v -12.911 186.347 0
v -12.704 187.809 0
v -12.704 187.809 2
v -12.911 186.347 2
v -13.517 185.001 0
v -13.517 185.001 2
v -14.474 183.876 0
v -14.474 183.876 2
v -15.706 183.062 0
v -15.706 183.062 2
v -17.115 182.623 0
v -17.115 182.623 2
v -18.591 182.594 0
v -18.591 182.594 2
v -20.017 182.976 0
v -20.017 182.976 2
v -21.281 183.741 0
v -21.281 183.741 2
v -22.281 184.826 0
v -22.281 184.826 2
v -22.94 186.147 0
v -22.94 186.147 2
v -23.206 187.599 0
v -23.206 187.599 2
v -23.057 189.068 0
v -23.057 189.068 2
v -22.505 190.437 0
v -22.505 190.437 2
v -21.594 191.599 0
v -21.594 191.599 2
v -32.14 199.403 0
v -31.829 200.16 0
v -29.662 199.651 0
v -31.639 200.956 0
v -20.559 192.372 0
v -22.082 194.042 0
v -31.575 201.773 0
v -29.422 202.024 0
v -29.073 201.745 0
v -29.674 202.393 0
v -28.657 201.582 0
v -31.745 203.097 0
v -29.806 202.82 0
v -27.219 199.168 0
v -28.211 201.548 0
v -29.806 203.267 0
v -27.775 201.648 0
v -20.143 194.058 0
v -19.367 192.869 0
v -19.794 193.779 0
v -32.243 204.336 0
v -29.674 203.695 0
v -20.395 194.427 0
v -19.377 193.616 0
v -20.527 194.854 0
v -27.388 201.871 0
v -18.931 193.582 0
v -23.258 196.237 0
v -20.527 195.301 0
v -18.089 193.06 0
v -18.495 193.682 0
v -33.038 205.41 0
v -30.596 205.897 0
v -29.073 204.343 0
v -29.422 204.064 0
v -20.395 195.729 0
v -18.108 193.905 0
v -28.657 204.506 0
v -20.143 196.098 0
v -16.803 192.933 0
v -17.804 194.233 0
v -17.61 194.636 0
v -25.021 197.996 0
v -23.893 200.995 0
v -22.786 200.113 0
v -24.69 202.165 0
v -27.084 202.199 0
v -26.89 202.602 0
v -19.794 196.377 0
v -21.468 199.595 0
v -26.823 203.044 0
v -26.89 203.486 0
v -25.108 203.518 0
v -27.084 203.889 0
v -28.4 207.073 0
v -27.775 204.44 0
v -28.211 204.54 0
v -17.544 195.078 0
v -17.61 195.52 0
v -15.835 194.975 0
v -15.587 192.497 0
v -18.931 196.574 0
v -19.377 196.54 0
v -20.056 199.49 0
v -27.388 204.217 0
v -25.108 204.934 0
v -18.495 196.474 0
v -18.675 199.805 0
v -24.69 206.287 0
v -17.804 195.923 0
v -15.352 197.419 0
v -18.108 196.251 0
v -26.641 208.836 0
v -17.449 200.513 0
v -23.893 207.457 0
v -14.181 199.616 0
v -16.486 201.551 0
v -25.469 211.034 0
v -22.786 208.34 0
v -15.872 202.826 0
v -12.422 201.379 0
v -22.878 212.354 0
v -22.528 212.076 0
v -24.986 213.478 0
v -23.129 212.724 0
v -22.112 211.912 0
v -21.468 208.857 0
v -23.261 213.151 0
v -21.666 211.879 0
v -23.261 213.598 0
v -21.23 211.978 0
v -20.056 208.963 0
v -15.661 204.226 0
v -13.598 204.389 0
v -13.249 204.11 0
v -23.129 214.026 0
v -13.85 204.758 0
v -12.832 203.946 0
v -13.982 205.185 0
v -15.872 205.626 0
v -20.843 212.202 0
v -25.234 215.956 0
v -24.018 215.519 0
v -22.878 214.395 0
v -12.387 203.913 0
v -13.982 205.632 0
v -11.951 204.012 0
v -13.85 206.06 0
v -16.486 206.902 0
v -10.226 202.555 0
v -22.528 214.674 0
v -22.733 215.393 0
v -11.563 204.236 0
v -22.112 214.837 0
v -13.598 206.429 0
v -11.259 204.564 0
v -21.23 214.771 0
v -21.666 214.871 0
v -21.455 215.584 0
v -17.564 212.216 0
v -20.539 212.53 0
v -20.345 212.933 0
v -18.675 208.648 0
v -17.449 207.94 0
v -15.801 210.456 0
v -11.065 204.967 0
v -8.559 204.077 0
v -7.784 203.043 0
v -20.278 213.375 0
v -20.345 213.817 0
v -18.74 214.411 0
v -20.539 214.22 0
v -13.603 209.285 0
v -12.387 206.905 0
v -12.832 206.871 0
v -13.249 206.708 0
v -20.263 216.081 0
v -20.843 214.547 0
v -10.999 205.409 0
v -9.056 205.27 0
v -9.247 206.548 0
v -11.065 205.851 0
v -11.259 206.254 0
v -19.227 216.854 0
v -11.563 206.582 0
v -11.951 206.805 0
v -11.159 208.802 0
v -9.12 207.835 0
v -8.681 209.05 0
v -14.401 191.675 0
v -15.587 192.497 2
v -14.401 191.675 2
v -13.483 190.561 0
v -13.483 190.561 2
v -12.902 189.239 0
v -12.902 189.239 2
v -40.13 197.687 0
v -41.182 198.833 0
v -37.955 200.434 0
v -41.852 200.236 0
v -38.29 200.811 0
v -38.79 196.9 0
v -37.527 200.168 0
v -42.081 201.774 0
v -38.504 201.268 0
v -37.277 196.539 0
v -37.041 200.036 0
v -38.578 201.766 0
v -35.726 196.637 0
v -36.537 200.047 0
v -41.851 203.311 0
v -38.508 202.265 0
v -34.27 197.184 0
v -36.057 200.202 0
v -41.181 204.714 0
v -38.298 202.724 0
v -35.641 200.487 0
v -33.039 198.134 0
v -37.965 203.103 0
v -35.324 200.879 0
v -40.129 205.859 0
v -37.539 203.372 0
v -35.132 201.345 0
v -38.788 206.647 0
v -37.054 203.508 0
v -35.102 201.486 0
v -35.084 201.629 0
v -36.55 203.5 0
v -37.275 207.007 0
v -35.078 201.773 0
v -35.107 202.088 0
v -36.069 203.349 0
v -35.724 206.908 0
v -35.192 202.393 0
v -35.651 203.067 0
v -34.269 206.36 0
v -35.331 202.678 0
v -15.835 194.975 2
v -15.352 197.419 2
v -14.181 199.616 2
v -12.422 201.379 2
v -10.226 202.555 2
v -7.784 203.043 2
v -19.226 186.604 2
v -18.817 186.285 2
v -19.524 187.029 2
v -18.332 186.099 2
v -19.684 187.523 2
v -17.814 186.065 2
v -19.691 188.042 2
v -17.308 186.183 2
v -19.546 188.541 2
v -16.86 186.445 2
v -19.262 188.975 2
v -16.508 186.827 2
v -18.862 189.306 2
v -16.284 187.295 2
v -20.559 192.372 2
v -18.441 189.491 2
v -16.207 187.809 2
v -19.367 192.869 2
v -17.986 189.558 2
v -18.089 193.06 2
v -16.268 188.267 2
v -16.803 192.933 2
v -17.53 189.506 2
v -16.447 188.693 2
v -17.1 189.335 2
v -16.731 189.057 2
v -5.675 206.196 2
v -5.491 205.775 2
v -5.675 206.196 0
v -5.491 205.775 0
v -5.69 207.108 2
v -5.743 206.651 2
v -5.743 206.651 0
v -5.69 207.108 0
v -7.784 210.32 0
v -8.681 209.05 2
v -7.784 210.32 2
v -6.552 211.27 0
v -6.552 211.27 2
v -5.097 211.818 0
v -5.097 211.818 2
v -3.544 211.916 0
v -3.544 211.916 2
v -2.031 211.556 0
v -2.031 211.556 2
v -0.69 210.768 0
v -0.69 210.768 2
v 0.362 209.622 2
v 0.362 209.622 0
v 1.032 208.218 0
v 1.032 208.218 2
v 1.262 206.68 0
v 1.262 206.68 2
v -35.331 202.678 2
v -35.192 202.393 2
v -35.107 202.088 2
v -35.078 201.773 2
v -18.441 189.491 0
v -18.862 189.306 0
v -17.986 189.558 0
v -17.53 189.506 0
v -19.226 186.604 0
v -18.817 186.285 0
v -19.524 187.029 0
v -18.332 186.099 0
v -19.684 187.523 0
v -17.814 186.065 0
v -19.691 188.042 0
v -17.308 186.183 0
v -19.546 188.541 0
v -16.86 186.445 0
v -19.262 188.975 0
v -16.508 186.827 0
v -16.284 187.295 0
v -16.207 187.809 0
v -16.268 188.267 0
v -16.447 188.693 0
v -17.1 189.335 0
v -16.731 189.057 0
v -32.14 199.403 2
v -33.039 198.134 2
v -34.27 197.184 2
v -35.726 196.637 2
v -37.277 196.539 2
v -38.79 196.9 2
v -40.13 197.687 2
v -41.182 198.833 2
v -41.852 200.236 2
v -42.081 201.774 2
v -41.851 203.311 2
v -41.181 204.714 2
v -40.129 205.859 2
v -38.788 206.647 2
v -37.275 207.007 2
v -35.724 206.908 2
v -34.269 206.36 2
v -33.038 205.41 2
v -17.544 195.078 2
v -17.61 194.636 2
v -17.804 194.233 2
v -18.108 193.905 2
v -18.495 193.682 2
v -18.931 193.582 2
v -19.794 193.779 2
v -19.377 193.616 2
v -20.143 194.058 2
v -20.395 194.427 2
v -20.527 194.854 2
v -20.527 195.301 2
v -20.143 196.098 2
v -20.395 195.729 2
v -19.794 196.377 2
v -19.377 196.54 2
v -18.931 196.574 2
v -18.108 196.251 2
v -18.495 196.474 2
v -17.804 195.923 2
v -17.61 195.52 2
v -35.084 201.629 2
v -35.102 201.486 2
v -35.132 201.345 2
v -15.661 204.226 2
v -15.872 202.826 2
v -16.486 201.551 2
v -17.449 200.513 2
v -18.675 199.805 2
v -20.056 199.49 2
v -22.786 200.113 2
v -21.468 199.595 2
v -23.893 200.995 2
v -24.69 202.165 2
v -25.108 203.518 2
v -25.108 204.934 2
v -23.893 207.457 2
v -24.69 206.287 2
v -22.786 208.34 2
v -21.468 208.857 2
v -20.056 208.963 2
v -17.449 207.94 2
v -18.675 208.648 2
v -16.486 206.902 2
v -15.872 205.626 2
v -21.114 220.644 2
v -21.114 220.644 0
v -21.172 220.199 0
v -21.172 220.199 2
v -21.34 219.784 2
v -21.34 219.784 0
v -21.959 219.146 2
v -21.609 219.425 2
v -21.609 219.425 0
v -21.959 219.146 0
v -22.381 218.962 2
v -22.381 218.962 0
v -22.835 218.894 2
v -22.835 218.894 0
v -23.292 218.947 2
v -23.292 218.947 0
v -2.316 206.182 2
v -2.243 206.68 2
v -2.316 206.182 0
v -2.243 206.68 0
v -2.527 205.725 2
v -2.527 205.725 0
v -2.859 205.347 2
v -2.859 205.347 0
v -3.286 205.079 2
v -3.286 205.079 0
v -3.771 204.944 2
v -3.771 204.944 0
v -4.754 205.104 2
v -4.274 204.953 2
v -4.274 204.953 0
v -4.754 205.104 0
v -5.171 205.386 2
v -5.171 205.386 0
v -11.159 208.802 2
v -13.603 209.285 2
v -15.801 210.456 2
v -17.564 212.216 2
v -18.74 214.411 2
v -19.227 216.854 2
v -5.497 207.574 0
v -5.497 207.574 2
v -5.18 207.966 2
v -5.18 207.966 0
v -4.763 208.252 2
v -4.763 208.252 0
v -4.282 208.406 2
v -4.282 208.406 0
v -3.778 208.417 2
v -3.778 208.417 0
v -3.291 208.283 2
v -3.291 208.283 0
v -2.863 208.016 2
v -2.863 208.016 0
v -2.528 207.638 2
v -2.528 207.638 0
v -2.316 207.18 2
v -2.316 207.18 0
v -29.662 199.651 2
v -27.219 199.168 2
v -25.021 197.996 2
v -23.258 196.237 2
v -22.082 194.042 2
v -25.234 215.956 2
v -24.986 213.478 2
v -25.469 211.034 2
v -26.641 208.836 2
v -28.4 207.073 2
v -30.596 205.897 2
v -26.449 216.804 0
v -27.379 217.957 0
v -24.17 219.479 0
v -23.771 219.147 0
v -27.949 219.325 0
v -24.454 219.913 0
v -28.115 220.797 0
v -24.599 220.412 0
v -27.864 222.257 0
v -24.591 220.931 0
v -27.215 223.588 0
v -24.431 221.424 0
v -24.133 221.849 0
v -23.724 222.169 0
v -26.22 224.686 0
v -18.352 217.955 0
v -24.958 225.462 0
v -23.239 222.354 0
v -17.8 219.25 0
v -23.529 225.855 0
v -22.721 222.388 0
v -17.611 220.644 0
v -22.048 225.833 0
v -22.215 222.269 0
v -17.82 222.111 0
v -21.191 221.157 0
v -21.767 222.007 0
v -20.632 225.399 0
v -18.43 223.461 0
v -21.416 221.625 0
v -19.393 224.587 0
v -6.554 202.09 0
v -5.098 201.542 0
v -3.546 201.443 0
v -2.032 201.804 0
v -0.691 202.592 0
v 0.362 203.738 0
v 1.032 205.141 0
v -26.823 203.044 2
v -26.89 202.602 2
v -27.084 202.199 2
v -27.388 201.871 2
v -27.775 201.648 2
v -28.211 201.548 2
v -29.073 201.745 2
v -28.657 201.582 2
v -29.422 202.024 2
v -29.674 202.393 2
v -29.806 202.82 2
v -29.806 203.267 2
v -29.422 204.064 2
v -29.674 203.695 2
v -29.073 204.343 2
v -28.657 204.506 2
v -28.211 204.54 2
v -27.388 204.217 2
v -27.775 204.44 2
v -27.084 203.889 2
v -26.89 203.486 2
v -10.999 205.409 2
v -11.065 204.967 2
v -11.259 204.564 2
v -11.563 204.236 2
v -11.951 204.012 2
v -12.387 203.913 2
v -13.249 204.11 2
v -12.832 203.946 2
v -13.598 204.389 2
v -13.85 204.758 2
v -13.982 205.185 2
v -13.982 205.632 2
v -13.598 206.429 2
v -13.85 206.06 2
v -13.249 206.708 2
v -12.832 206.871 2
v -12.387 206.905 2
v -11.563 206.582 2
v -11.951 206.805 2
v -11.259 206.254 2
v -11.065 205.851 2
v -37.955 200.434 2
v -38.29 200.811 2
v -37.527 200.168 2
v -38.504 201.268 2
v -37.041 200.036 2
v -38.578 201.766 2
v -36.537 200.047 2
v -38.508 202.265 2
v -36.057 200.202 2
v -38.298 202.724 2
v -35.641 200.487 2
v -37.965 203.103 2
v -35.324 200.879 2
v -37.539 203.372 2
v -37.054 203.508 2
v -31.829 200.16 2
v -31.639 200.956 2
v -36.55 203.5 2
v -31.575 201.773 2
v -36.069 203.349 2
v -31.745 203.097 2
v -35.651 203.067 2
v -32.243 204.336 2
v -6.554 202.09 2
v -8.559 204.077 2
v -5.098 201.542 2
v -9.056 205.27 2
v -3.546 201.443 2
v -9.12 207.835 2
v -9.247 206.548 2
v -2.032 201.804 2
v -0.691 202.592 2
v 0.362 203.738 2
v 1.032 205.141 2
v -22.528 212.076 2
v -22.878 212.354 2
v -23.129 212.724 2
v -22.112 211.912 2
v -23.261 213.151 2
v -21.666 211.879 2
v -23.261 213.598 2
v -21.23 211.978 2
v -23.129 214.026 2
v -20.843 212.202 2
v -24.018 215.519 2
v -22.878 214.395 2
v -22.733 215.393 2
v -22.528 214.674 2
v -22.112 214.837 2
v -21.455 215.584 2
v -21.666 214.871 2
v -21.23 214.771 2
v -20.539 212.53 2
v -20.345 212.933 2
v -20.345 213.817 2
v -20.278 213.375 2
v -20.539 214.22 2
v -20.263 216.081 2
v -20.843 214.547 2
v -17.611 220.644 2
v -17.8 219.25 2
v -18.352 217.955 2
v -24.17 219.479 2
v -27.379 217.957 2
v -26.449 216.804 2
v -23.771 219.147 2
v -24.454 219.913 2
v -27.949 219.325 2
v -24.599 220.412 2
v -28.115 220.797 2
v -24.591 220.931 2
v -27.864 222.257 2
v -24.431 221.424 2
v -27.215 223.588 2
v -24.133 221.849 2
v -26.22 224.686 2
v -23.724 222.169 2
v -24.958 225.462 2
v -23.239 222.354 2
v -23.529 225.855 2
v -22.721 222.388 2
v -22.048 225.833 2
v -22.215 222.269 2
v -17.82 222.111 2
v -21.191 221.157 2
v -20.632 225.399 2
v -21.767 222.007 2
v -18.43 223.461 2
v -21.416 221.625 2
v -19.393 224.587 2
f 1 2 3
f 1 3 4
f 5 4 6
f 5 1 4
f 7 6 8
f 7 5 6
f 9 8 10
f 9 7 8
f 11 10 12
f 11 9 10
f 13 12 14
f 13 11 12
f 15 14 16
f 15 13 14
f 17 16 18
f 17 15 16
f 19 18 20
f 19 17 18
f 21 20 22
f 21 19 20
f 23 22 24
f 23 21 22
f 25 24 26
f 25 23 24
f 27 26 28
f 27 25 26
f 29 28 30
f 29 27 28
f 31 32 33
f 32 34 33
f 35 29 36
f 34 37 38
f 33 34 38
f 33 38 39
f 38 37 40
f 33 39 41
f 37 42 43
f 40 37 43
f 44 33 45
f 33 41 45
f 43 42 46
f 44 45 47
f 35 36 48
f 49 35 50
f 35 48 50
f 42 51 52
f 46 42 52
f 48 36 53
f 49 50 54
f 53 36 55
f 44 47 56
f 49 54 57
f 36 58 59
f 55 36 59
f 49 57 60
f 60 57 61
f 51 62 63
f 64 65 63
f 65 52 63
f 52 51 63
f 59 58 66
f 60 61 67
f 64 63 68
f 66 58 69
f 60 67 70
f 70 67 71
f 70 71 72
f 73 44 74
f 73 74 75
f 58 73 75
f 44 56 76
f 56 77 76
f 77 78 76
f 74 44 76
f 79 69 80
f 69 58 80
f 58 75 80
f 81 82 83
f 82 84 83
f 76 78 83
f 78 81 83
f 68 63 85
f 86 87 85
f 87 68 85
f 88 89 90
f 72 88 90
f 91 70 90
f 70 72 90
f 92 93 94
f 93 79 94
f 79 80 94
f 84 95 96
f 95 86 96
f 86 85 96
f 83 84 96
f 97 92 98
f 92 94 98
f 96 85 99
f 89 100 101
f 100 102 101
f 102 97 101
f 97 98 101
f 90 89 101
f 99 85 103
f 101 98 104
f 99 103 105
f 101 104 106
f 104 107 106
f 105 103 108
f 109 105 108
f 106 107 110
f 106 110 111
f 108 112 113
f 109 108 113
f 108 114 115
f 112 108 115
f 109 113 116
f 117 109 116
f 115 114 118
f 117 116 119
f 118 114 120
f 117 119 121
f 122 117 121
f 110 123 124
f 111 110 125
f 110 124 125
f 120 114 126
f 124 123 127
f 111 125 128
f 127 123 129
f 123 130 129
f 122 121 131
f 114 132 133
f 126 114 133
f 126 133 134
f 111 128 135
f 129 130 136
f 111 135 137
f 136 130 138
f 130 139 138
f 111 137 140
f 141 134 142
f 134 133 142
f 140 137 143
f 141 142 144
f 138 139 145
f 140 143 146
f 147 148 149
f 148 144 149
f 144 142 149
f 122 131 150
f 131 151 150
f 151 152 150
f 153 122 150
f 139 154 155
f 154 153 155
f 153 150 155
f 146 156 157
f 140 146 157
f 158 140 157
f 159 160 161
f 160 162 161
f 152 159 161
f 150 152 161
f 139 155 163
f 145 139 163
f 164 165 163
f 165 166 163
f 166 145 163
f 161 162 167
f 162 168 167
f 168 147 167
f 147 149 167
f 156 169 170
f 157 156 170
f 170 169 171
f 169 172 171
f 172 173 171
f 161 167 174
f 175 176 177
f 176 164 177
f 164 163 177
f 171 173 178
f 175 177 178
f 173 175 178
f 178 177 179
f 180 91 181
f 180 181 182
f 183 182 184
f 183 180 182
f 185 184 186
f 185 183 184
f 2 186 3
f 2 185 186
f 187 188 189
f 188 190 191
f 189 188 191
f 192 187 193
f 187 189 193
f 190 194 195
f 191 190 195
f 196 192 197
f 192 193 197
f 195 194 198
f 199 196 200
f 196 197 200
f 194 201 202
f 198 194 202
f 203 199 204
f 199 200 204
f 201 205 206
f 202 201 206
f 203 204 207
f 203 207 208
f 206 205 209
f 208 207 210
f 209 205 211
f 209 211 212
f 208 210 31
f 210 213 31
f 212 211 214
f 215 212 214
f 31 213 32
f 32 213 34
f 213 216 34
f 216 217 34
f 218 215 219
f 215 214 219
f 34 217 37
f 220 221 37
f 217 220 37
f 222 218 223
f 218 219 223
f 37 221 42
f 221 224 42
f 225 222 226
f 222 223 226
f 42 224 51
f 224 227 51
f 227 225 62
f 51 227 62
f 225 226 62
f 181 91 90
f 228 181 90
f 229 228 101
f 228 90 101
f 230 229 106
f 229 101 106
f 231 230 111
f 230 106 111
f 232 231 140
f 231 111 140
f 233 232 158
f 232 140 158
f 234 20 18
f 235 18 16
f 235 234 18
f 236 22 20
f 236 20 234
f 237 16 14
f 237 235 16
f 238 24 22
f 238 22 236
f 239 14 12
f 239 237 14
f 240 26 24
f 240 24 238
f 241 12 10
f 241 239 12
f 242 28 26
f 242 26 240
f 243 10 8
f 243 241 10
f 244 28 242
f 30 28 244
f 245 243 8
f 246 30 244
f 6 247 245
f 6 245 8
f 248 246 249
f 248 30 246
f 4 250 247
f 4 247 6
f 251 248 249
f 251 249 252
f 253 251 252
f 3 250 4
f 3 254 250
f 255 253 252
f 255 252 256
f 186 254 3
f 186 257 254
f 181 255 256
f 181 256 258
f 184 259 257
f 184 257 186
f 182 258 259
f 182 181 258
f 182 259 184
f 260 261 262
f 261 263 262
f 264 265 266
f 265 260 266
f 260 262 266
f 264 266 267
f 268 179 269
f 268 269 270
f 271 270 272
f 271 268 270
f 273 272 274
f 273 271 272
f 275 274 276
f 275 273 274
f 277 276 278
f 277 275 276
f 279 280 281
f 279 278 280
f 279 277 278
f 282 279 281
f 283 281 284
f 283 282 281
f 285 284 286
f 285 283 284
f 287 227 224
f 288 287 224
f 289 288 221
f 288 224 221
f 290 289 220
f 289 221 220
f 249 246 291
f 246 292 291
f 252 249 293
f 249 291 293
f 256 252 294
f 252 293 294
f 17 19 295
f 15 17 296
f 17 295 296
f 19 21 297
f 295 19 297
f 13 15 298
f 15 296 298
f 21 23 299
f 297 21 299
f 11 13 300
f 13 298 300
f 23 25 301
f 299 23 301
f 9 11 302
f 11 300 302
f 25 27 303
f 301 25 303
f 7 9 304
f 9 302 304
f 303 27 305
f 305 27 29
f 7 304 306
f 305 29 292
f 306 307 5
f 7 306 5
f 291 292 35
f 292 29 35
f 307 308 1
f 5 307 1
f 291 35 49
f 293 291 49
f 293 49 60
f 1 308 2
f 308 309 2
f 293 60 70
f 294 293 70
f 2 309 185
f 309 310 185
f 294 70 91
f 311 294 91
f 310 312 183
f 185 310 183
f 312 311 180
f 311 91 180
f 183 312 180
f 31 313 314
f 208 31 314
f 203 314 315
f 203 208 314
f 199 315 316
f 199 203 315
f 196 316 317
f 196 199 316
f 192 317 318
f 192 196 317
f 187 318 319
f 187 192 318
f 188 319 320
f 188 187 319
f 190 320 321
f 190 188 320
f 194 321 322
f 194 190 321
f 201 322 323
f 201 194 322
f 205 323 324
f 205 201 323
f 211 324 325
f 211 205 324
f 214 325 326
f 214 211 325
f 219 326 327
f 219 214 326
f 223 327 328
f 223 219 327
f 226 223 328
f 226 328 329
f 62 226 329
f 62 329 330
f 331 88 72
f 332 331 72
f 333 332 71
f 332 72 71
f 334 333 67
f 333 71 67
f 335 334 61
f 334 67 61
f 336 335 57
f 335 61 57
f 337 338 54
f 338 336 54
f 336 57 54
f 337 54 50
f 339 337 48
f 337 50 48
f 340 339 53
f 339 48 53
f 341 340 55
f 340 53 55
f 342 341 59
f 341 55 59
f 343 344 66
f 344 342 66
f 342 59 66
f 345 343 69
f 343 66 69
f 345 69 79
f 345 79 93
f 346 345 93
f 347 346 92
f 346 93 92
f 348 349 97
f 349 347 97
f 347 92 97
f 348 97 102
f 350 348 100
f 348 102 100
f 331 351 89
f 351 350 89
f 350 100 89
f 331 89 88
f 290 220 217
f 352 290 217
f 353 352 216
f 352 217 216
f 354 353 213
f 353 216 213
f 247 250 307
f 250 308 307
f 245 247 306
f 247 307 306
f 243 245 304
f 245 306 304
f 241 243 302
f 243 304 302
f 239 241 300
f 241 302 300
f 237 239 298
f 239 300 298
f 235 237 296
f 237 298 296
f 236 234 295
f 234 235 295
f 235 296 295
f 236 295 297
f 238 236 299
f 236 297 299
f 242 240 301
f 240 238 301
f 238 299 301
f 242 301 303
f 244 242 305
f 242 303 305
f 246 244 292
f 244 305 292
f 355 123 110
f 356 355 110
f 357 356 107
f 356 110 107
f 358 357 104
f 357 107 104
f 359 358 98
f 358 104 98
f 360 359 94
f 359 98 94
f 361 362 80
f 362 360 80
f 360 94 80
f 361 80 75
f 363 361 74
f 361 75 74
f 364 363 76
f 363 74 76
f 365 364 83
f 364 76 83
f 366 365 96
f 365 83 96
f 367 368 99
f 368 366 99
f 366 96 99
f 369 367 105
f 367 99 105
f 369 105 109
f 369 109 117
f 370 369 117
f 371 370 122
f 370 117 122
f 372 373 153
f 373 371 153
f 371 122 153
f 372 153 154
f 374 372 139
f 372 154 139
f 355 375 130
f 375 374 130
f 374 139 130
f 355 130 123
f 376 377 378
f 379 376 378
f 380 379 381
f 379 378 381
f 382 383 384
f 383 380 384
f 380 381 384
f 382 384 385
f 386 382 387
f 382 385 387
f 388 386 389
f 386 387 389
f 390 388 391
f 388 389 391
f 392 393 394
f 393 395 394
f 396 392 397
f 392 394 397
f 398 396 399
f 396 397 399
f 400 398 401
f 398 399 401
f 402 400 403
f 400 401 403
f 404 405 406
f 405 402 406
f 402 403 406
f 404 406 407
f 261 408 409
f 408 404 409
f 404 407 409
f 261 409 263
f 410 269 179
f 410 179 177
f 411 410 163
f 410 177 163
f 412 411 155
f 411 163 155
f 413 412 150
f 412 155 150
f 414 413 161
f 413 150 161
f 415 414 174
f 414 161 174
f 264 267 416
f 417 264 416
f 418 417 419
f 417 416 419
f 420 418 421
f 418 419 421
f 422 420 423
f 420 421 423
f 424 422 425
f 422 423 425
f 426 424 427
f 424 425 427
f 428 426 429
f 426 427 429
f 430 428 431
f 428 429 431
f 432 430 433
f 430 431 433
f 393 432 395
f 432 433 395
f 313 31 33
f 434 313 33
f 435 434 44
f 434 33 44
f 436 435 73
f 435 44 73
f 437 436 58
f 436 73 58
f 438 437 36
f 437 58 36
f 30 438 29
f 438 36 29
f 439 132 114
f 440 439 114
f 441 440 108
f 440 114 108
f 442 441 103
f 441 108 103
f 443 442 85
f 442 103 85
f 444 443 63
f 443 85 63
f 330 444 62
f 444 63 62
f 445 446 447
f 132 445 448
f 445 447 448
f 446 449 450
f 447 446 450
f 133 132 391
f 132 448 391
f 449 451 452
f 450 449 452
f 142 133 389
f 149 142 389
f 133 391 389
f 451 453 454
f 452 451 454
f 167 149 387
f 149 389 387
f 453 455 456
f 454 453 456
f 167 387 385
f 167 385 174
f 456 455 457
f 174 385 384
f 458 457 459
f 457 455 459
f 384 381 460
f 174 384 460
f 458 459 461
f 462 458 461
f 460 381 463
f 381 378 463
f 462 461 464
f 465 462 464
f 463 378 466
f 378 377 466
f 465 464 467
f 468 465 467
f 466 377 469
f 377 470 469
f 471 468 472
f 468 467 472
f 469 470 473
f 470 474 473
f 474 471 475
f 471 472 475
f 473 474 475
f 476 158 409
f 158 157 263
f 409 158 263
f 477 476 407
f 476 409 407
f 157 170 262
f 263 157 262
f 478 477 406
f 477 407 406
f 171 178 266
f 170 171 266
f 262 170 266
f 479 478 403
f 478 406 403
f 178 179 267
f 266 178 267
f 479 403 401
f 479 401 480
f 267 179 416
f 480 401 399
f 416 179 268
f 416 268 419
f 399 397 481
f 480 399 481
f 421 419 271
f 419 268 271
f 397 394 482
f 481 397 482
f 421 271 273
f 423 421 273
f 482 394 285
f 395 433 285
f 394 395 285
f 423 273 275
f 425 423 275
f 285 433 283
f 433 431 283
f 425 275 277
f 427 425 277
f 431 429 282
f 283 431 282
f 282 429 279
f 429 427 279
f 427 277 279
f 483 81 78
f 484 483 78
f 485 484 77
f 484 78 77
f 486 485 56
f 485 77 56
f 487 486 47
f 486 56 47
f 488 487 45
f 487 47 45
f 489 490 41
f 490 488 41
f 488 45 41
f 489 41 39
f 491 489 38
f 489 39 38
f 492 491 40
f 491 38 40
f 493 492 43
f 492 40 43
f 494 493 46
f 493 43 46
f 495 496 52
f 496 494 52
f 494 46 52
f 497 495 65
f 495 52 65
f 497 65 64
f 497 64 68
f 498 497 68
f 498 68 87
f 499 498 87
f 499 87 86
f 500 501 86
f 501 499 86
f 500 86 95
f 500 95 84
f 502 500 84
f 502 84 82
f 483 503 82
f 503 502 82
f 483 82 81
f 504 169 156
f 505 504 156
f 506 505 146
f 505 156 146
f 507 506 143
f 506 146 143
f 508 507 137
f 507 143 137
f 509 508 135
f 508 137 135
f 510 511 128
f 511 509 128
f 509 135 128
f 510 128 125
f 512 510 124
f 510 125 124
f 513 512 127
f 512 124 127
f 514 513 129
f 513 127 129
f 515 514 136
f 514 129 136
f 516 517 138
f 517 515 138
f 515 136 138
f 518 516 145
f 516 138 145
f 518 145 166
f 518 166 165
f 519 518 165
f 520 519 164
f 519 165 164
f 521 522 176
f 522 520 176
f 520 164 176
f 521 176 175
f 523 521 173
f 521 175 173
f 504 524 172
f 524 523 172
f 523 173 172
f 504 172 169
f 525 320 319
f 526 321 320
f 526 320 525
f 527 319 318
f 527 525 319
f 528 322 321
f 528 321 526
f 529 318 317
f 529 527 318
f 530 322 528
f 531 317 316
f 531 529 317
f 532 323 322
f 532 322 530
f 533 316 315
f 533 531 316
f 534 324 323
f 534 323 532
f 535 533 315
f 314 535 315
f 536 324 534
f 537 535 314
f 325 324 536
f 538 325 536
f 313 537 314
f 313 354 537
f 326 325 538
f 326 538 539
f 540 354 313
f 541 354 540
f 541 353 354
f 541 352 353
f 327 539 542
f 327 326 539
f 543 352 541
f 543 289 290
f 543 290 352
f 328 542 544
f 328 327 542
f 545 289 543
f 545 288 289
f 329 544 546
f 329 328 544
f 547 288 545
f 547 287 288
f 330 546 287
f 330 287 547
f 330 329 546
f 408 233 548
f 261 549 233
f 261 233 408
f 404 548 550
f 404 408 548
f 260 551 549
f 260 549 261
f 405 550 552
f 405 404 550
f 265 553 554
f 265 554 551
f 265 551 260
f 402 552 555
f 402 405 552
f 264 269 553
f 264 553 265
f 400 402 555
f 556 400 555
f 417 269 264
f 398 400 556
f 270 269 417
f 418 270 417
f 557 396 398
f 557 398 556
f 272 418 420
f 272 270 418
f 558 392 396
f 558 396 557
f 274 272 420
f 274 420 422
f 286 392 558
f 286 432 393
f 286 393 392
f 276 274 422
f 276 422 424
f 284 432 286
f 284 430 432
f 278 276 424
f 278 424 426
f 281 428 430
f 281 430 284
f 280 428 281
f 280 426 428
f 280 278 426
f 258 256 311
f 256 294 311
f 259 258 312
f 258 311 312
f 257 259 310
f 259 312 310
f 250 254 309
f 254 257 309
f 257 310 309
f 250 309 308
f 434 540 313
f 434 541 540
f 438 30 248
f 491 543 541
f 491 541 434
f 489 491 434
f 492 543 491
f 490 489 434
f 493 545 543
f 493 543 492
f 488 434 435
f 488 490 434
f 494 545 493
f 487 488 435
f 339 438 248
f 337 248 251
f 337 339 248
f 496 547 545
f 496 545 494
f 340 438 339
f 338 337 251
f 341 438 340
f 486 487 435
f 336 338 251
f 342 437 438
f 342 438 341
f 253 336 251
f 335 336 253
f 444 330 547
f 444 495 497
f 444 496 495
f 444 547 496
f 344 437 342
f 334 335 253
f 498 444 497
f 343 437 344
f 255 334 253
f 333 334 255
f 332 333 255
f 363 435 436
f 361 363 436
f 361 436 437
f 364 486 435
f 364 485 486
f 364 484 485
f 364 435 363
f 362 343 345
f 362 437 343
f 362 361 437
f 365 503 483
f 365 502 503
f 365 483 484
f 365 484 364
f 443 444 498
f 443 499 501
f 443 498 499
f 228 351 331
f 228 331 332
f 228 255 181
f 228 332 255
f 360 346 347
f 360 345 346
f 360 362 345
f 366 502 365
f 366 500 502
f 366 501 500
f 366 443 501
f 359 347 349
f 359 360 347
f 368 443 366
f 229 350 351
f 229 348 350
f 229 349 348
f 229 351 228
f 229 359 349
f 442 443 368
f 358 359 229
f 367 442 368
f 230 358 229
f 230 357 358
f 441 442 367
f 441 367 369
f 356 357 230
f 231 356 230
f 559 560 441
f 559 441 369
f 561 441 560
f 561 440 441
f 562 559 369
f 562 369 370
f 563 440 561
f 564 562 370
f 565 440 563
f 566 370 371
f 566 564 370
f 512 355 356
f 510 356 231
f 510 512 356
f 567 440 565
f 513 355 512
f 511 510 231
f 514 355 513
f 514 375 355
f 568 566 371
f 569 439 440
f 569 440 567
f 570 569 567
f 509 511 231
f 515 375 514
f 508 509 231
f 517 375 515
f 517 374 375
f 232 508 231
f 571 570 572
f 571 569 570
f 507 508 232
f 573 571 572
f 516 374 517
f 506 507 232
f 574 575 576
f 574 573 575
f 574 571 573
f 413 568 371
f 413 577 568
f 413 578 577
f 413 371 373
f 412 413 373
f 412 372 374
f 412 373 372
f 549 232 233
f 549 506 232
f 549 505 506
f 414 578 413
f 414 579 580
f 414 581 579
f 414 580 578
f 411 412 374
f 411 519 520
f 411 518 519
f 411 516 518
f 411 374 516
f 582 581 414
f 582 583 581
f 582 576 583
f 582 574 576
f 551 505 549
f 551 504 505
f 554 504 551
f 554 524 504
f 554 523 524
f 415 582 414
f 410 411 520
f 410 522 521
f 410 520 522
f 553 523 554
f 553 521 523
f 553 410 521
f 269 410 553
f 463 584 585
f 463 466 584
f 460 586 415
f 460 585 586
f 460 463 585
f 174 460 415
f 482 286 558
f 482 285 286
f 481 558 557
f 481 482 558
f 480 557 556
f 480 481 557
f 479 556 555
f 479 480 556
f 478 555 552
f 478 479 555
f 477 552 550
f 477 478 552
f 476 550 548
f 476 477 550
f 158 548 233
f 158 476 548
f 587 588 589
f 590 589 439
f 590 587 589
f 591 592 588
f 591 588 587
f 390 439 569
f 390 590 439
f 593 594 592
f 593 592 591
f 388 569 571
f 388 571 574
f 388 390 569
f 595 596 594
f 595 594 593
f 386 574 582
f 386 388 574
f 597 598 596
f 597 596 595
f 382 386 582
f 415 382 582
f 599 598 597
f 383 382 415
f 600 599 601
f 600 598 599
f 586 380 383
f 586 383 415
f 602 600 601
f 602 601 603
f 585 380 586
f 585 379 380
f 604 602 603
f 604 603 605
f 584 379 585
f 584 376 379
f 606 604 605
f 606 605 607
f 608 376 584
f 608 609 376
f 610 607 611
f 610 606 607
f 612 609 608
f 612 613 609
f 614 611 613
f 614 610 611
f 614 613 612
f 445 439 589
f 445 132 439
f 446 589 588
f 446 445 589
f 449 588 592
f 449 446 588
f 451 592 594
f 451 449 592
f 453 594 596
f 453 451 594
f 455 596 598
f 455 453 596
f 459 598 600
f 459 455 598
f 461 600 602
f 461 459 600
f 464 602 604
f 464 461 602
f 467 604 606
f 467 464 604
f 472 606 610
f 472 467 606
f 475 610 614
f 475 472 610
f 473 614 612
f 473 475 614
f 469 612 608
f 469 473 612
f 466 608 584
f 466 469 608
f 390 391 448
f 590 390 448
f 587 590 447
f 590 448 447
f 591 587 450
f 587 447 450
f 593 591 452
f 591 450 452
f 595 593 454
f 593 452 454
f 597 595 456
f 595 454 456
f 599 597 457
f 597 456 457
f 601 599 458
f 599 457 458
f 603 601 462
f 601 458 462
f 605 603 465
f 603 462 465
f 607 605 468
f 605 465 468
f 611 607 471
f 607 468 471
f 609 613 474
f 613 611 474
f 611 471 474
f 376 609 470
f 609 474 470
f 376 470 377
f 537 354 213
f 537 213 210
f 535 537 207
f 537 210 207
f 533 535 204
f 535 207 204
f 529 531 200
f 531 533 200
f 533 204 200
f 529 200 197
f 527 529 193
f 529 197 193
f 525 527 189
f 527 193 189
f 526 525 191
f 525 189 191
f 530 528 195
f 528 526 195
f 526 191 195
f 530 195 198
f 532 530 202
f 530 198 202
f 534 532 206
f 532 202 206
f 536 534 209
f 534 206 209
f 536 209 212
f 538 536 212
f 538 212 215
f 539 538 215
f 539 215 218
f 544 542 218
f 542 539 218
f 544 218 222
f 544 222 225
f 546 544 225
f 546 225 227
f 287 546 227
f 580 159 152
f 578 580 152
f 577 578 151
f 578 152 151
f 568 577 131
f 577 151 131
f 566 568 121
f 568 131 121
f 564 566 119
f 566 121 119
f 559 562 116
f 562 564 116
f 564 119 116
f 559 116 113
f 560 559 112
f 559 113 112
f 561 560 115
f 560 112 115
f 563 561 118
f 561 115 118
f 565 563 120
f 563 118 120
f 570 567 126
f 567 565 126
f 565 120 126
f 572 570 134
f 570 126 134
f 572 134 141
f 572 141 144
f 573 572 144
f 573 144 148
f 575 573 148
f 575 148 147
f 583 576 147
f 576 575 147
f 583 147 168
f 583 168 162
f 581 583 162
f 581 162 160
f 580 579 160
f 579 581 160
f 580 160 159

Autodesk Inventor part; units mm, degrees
ref_plane "YZ Plane" through (0, 0, 0) normal (1, 0, 0) x (0, 1, 0)
ref_plane "XZ Plane" through (0, 0, 0) normal (0, 1, 0) x (-1, 0, 0)
ref_plane "XY Plane" through (0, 0, 0) normal (0, 0, 1) x (1, 0, 0)
sketch "Sketch1" plane through (0, 0, 0) normal (0, 0, 1) x (1, 0, 0)
  circle A0 centre (-12.4986, 205.4088) radius 1.5 projected
  circle A1 centre (-21.778, 213.3747) radius 1.5 projected
  circle A2 centre (-28.3229, 203.0439) radius 1.5 projected
  circle A3 centre (-19.0435, 195.0779) radius 1.5 projected
  arc A4 (-18.8621, 189.3065) -> (-17.5296, 189.5057) centre (-17.9571, 187.8087) ccw projected
  arc A5 (-5.4909, 205.775) -> (-5.6901, 207.1075) centre (-3.9931, 206.68) ccw projected
  arc A6 (-35.3306, 202.6777) -> (-35.1315, 201.3452) centre (-36.8284, 201.7727) ccw projected
  arc A7 (-21.9594, 219.1462) -> (-23.2919, 218.947) centre (-22.8644, 220.644) ccw projected
  arc A8 (-19.2274, 216.8536) -> (-8.6812, 209.0499) centre (-10.7552, 217.2751) ccw projected
  arc A9 (-33.0381, 205.4097) -> (-25.2343, 215.9559) centre (-33.4595, 213.8819) ccw projected
  arc A10 (-21.5941, 191.5991) -> (-32.1403, 199.4028) centre (-30.0663, 191.1776) ccw projected
  arc A11 (-7.7835, 203.043) -> (-15.5873, 192.4968) centre (-7.362, 194.5708) ccw projected
  circle A12 centre (-3.9931, 206.68) radius 5.2556
  circle A13 centre (-22.8644, 220.644) radius 5.2531
  circle A14 centre (-36.8284, 201.7727) radius 5.2531
  circle A15 centre (-17.9571, 187.8087) radius 5.2531
  circle A16 centre (-3.9931, 206.68) radius 1.75
  circle A17 centre (-22.8644, 220.644) radius 1.75
  circle A18 centre (-36.8284, 201.7727) radius 1.75
  circle A19 centre (-17.9571, 187.8087) radius 1.75
  circle A20 centre (-20.4108, 204.2263) radius 4.75 projected
  point P0 (0, 0)
  point P1 (-18.8621, 189.3065)
  point P2 (-17.5296, 189.5057)
  point P3 (-21.9594, 219.1462)
  point P4 (-23.2919, 218.947)
  point P5 (-5.4909, 205.775)
  point P6 (-5.6901, 207.1075)
  point P7 (-32.1403, 199.4028)
  point P8 (-21.5941, 191.5991)
  point P9 (-7.7868, 203.0428)
  point P10 (-8.6845, 209.0491)
  point P11 (-25.2343, 215.9559)
extrude "Extrusion1" add sketch "Sketch1" along normal blind 2
properties material "Steel"
